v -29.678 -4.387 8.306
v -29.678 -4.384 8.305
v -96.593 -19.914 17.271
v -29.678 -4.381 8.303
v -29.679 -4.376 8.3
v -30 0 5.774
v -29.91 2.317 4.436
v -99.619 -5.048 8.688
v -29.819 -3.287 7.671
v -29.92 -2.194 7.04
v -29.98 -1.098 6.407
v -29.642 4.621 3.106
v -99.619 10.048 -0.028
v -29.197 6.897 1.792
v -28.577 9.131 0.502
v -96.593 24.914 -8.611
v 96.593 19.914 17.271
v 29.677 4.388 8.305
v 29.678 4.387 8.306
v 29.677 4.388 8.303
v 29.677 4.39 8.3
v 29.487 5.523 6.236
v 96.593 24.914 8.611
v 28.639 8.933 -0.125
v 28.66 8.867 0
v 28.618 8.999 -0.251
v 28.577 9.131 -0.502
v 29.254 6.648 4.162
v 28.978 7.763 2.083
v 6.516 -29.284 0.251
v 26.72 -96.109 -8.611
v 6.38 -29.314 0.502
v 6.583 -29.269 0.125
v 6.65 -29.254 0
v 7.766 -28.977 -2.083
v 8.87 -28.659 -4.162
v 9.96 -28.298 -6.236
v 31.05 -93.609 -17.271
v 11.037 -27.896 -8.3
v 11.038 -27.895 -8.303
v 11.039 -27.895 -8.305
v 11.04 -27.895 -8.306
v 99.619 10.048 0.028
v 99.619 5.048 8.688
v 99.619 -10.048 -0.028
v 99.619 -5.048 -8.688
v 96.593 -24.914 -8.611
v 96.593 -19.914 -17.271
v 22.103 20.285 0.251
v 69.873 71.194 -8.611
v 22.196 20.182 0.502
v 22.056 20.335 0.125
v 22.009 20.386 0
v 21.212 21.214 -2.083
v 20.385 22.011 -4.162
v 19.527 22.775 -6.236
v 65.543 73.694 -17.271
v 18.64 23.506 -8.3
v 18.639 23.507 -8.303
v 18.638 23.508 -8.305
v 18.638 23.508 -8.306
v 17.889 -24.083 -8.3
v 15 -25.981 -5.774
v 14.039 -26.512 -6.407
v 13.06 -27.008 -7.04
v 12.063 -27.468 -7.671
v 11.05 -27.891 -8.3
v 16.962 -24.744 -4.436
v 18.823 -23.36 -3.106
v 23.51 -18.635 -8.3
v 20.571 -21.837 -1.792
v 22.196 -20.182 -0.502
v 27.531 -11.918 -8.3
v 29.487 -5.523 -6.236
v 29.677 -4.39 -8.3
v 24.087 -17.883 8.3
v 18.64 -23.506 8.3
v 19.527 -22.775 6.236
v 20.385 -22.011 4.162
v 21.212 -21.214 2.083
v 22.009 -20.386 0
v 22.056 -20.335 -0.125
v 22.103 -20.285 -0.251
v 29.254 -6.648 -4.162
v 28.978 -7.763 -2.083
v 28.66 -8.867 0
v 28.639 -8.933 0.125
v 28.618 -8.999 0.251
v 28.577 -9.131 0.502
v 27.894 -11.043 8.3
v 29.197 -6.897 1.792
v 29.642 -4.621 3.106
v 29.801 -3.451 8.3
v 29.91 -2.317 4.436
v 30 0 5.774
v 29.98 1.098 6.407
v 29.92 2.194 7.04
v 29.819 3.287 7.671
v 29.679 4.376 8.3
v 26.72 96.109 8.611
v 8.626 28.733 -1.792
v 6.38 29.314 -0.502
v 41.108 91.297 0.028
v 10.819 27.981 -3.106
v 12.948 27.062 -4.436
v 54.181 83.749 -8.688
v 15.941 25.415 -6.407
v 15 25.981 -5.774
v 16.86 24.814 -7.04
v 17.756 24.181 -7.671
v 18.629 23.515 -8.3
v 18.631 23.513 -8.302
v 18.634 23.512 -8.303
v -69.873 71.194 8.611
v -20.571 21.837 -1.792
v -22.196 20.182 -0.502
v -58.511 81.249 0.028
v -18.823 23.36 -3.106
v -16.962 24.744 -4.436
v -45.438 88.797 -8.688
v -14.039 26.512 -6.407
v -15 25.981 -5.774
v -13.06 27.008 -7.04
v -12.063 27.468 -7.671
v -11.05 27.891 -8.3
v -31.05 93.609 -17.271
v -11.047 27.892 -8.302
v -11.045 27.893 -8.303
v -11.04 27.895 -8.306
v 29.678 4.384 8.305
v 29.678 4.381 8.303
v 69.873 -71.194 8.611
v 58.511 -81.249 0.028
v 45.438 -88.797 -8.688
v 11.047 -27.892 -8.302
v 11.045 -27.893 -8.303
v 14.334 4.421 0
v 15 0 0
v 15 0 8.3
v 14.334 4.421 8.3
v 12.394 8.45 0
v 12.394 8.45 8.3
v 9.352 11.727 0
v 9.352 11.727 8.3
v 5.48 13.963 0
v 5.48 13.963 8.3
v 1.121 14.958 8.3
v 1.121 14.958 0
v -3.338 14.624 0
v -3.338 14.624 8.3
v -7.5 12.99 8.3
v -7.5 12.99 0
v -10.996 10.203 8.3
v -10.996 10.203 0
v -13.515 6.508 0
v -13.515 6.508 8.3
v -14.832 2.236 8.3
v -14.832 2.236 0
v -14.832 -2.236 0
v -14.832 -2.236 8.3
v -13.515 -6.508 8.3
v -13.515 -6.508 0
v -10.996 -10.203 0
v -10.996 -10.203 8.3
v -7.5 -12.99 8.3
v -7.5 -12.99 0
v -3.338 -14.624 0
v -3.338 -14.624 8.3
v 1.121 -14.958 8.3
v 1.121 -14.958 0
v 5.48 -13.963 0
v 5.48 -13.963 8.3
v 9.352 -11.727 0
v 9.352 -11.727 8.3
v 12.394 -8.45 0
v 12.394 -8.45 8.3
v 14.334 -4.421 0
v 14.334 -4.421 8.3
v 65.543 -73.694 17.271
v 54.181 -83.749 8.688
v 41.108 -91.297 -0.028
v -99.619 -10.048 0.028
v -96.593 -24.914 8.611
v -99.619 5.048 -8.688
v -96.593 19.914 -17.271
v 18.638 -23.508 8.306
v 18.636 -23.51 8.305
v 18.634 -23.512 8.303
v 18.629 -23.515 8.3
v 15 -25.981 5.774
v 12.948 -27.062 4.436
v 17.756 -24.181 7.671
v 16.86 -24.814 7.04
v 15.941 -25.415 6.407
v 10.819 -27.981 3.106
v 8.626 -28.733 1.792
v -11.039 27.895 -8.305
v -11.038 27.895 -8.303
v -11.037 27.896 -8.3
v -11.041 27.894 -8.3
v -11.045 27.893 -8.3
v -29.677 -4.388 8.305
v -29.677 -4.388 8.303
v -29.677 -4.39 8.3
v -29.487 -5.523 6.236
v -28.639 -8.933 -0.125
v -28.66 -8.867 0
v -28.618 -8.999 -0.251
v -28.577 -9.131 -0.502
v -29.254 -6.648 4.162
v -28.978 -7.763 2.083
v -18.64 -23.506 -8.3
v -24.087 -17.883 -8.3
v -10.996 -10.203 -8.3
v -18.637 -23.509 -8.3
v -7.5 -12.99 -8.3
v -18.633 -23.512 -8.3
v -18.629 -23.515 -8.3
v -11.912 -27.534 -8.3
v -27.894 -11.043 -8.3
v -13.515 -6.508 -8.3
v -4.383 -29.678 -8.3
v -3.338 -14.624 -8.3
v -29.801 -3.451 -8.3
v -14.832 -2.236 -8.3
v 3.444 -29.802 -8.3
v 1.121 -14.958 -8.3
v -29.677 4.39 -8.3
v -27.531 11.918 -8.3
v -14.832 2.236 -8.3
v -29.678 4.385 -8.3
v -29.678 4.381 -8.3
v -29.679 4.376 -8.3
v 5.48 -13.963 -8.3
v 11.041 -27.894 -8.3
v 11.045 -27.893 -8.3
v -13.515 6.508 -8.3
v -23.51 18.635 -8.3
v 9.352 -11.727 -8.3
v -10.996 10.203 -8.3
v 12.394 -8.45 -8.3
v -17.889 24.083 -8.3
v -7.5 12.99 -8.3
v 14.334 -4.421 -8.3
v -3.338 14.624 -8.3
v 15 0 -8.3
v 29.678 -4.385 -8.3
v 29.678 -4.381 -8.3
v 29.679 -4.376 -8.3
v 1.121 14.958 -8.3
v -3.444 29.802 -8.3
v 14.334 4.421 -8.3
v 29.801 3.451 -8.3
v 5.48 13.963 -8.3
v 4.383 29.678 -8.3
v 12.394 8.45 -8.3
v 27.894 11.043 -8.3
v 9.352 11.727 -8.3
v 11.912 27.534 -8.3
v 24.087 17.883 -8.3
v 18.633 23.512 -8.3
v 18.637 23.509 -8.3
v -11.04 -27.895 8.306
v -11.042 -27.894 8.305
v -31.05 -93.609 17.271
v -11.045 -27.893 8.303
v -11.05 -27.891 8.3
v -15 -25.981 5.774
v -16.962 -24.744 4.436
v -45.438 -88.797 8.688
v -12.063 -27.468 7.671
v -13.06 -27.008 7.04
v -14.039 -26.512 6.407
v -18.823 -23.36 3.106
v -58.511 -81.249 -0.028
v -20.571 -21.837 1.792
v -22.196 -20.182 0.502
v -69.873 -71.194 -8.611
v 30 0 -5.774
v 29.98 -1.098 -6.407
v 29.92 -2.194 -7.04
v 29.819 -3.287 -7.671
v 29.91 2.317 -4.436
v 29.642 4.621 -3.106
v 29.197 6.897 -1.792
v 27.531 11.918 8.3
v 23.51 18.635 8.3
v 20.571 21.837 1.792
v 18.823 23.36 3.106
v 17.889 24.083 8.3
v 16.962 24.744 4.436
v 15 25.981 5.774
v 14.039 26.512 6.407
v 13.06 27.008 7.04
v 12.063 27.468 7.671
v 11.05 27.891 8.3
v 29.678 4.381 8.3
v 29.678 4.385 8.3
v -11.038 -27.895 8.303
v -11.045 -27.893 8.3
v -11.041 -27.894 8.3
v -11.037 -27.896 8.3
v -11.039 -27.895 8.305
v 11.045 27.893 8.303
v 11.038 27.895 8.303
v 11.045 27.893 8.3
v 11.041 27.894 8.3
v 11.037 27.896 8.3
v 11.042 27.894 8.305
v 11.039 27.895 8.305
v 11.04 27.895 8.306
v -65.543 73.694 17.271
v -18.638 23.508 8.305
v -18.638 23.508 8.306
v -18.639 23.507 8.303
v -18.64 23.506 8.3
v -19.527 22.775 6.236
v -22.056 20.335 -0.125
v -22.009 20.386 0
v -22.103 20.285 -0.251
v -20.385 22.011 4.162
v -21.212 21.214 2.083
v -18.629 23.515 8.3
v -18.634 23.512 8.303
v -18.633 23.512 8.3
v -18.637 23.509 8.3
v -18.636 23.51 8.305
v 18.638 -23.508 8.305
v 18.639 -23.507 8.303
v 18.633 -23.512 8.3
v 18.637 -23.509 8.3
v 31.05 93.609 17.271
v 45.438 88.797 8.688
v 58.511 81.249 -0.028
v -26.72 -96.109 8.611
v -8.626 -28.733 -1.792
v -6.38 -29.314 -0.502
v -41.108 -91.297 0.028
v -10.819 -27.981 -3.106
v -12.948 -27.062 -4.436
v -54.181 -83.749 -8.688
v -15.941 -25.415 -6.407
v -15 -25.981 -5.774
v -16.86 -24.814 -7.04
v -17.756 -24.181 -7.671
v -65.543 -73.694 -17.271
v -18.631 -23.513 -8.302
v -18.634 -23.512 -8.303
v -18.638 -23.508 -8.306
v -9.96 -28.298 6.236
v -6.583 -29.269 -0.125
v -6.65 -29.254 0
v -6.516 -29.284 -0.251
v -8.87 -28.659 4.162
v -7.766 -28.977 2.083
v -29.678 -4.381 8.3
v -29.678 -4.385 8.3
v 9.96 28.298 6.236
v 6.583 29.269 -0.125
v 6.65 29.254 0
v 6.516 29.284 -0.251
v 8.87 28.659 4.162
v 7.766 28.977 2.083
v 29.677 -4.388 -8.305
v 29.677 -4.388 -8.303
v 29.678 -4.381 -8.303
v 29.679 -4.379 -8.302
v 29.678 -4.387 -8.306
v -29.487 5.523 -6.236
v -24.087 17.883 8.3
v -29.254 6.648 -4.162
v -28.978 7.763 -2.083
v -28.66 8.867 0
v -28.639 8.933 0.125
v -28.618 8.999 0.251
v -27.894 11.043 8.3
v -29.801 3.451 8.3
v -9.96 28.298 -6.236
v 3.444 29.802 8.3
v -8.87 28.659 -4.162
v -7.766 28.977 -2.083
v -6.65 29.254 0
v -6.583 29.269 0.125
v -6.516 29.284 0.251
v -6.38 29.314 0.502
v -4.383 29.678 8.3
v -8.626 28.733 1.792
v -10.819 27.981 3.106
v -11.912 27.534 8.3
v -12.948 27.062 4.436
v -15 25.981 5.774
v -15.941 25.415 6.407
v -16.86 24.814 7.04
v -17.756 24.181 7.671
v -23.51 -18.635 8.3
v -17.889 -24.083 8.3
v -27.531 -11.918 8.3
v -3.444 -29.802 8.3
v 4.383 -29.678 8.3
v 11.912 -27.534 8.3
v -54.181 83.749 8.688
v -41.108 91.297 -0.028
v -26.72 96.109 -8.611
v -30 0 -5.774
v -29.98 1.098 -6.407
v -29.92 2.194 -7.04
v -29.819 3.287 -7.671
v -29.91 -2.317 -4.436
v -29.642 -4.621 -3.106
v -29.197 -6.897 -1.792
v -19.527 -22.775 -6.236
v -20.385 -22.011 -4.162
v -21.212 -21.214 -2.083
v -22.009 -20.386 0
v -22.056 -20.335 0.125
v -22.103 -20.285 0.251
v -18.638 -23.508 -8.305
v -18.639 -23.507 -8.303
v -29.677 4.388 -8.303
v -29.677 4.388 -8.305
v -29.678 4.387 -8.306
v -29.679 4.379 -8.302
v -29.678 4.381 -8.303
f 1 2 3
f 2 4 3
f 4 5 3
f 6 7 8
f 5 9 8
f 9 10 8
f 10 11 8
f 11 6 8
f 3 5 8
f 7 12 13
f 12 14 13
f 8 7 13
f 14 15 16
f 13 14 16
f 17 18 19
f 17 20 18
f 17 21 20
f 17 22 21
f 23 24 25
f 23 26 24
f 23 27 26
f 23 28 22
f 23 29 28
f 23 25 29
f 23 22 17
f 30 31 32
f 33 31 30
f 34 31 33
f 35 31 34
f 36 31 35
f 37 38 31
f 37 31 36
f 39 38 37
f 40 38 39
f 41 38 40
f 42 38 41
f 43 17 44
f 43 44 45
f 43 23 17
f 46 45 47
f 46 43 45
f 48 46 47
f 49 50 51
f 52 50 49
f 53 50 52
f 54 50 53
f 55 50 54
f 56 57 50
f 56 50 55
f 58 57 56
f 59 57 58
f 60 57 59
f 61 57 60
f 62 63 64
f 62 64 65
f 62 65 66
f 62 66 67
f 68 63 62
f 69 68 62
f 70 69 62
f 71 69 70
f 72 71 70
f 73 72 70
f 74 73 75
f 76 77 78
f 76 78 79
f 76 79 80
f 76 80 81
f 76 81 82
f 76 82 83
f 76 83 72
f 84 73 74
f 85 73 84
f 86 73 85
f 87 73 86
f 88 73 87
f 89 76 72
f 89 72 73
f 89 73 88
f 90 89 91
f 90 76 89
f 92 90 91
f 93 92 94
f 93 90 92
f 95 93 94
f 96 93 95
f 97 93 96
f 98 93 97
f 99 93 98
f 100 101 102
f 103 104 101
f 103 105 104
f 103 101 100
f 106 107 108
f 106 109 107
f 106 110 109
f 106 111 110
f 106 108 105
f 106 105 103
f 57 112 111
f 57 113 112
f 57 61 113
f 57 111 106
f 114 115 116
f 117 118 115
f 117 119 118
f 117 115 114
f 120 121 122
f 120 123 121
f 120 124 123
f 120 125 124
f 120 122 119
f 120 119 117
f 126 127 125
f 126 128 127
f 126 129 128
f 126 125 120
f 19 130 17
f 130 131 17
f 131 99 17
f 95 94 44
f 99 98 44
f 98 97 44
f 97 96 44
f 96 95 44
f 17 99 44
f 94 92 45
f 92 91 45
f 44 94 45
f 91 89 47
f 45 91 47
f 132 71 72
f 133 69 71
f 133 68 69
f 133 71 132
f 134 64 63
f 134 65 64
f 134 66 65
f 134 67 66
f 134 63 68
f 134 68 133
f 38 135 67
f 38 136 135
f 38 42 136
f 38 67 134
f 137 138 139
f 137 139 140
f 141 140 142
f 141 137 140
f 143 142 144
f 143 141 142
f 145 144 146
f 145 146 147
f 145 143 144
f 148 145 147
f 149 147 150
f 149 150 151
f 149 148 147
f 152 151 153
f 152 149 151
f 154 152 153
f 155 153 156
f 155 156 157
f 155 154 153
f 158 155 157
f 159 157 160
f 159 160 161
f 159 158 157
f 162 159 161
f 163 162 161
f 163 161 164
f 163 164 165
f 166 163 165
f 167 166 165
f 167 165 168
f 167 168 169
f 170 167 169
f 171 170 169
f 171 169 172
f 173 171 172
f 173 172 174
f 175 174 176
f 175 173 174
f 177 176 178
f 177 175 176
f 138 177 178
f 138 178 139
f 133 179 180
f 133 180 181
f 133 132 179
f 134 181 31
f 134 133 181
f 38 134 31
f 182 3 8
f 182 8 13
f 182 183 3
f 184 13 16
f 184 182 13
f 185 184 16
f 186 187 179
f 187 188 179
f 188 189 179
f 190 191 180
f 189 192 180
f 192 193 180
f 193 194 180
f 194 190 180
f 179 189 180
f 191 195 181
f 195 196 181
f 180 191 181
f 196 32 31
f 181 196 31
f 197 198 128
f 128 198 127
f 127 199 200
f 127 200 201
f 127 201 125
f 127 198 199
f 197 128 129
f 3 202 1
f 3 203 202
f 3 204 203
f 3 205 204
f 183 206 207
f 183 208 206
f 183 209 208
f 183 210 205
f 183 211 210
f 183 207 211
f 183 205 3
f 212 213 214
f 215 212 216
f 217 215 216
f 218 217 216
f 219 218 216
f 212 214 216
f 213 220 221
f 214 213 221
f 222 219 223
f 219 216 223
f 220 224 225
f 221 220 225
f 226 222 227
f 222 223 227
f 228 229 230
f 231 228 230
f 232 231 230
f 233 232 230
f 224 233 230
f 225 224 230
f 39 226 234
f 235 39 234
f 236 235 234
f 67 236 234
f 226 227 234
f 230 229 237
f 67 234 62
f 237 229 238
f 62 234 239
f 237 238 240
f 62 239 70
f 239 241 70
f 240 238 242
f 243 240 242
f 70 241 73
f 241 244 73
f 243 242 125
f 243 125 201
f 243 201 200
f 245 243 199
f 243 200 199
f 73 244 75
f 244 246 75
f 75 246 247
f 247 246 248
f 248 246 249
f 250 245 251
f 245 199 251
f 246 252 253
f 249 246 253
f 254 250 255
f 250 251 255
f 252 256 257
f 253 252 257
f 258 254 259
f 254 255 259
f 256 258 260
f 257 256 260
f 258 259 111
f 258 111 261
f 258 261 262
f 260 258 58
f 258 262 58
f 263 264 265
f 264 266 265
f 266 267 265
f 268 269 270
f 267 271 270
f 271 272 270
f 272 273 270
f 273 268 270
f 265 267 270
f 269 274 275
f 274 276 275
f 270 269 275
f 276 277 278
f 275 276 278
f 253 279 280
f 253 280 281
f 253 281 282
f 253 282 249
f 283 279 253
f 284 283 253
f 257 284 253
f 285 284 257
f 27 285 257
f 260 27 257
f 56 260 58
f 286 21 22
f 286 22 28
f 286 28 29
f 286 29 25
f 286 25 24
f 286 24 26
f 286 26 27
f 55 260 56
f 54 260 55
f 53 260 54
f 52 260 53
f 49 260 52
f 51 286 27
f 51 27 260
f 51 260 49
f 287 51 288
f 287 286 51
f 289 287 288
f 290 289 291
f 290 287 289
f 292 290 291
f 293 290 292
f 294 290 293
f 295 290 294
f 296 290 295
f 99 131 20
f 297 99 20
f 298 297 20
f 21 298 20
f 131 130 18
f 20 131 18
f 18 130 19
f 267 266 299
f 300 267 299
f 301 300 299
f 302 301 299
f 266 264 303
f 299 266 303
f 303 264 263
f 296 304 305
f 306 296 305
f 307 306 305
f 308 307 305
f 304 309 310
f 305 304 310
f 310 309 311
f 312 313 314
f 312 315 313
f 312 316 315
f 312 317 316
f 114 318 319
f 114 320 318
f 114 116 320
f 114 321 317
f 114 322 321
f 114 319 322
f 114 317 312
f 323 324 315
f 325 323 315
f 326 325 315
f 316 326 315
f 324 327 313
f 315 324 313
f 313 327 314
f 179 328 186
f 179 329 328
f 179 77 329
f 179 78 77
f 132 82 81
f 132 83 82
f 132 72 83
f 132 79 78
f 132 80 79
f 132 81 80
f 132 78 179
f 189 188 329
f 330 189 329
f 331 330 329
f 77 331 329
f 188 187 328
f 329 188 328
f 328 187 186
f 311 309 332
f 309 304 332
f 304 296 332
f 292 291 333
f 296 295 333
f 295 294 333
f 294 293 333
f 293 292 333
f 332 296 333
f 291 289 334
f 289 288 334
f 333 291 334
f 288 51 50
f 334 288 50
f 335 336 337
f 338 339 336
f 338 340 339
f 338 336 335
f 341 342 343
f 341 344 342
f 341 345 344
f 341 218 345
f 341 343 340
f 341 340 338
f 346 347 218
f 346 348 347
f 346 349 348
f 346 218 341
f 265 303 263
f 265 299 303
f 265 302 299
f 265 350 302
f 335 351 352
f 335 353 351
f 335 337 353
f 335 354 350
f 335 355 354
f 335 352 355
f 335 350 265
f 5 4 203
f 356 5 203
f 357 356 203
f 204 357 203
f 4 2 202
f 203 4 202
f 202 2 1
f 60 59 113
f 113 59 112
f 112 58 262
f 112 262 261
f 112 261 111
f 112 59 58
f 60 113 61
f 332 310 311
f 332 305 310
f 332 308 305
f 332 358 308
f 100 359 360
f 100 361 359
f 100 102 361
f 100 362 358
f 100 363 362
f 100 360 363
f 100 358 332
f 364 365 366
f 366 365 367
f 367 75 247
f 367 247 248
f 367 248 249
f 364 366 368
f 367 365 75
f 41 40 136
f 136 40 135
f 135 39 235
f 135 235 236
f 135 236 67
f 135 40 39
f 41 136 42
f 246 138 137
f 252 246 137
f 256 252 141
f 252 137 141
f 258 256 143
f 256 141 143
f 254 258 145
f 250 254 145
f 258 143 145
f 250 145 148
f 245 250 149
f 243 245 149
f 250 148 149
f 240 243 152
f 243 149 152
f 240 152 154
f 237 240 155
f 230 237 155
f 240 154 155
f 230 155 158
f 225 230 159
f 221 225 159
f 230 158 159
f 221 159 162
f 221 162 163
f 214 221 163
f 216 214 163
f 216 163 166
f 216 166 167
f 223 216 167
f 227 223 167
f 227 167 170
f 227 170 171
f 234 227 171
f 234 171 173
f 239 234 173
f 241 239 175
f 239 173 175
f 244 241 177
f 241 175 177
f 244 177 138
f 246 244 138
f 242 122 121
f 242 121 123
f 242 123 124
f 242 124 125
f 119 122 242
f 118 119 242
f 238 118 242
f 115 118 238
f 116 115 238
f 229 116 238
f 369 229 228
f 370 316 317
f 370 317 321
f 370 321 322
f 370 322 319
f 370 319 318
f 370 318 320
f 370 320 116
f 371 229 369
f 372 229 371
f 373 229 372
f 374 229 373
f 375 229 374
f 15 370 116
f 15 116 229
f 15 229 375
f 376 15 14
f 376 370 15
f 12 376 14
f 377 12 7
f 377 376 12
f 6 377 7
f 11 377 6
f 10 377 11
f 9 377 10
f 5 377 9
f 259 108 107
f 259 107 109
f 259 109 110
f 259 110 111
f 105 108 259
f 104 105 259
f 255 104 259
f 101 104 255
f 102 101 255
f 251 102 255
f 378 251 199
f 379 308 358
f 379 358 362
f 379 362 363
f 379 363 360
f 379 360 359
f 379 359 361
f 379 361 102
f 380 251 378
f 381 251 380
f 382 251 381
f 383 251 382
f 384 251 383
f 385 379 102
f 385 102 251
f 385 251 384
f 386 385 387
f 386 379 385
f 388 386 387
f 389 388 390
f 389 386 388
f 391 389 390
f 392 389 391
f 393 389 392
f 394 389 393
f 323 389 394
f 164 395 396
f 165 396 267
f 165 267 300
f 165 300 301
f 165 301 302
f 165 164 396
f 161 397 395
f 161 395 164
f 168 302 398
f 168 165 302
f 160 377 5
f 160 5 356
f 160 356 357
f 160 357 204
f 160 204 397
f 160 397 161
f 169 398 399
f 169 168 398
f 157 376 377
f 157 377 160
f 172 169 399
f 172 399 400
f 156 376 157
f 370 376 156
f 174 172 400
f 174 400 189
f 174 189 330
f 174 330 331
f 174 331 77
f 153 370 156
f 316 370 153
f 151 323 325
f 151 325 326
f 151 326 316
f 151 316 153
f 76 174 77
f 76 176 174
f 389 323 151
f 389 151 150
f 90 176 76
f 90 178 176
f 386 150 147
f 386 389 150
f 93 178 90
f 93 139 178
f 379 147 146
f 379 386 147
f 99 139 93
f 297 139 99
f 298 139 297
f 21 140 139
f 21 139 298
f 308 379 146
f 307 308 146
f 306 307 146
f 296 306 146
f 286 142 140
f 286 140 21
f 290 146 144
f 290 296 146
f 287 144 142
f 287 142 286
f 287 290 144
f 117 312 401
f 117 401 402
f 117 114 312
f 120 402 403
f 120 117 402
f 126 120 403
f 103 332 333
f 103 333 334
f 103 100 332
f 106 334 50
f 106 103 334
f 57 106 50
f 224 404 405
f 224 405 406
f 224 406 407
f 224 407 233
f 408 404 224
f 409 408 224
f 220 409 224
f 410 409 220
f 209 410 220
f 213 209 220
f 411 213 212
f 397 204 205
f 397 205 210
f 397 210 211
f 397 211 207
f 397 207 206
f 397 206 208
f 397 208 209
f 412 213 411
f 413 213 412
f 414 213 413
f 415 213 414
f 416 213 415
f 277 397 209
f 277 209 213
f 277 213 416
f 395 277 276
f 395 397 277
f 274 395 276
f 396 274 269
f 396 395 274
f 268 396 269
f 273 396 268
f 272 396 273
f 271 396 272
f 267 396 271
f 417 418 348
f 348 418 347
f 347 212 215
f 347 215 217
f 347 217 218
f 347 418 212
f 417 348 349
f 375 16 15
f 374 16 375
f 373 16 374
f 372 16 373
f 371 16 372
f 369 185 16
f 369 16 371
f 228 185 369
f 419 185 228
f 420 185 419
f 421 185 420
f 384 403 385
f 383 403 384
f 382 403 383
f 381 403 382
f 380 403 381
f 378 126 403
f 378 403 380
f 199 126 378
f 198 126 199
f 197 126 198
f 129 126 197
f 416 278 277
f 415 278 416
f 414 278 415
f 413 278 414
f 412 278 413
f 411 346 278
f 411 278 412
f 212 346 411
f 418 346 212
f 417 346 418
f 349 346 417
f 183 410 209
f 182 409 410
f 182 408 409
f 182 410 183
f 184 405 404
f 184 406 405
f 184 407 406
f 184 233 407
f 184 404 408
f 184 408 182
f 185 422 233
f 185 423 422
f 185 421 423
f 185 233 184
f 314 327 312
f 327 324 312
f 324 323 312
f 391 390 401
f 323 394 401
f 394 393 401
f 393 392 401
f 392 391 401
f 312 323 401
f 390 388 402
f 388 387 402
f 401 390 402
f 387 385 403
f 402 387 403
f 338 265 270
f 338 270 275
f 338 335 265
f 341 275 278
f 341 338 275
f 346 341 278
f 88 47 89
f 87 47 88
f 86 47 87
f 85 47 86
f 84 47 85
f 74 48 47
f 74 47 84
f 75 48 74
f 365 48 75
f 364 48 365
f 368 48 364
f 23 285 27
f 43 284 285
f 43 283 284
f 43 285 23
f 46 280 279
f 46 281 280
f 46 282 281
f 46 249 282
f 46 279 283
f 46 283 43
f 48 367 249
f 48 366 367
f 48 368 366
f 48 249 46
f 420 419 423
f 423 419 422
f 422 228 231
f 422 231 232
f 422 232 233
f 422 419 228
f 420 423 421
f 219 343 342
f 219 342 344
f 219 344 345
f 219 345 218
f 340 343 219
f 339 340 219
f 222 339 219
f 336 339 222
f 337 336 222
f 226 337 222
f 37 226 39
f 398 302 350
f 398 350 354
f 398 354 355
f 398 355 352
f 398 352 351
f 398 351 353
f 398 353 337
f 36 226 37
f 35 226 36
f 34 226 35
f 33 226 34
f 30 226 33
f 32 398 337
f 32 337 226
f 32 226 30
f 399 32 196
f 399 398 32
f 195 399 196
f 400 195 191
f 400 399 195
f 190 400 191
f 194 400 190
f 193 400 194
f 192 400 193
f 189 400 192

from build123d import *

# Parameters (mm, degrees)
F5_DEPTH      = 5
F3_R          = 30
F6_DEPTH      = 12.5
F7_COUNT      = 6
F8_R          = 30
F8_R_2        = 15
F9_DEPTH      = 8.3
F9_DEPTH_BACK = 8.3


with BuildPart() as f5:
    # F2 (on line) → F5 (new body, symmetric)
    with BuildSketch(Plane(origin=(0, 0, 0), x_dir=(1, 0, 0), z_dir=(0, 0.5, -0.8660254038))):
        with BuildLine():
            Line((28.9777747887, -7.7645713531), (96.5925826289, -25.8819045103))
            ThreePointArc((96.5925826289, -25.8819045103), (100, 0), (96.5925826289, 25.8819045103))
            Line((96.5925826289, 25.8819045103), (28.9777747887, 7.7645713531))
            Line((28.9777747887, 7.7645713531), (0, 0))
            Line((0, 0), (28.9777747887, -7.7645713531))
        make_face()
    extrude(amount=F5_DEPTH, both=True)

    # F3 (on Top) → F6 (cut, symmetric)
    with BuildSketch(Plane.XY):
        Circle(F3_R)
    extrude(amount=F6_DEPTH, both=True, mode=Mode.SUBTRACT)


with BuildPart() as f7_1:
    # F7: instance of F5
    add(f5.part.rotate(Axis((0, 0, 1.348067075), (0, 0, 1)), 1 * 360 / F7_COUNT))


with BuildPart() as f7_2:
    # F7: instance of F5
    add(f5.part.rotate(Axis((0, 0, 1.348067075), (0, 0, 1)), 2 * 360 / F7_COUNT))


with BuildPart() as f7_3:
    # F7: instance of F5
    add(f5.part.rotate(Axis((0, 0, 1.348067075), (0, 0, 1)), 3 * 360 / F7_COUNT))


with BuildPart() as f7_4:
    # F7: instance of F5
    add(f5.part.rotate(Axis((0, 0, 1.348067075), (0, 0, 1)), 4 * 360 / F7_COUNT))


with BuildPart() as f7_5:
    # F7: instance of F5
    add(f5.part.rotate(Axis((0, 0, 1.348067075), (0, 0, 1)), 5 * 360 / F7_COUNT))


with BuildPart() as f5_1:
    add(f5.part)

    add(f7_1.part)  # F9 merges F7_1

    add(f7_2.part)  # F9 merges F7_2

    add(f7_3.part)  # F9 merges F7_3

    add(f7_4.part)  # F9 merges F7_4

    add(f7_5.part)  # F9 merges F7_5
    # F8 (on Top) → F9 (join, two sides)
    with BuildSketch(Plane.XY) as f9_sk:
        Circle(F8_R)
        Circle(F8_R_2, mode=Mode.SUBTRACT)
    extrude(amount=F9_DEPTH)
    extrude(f9_sk.sketch, amount=-F9_DEPTH_BACK)


solid = f5_1.part
